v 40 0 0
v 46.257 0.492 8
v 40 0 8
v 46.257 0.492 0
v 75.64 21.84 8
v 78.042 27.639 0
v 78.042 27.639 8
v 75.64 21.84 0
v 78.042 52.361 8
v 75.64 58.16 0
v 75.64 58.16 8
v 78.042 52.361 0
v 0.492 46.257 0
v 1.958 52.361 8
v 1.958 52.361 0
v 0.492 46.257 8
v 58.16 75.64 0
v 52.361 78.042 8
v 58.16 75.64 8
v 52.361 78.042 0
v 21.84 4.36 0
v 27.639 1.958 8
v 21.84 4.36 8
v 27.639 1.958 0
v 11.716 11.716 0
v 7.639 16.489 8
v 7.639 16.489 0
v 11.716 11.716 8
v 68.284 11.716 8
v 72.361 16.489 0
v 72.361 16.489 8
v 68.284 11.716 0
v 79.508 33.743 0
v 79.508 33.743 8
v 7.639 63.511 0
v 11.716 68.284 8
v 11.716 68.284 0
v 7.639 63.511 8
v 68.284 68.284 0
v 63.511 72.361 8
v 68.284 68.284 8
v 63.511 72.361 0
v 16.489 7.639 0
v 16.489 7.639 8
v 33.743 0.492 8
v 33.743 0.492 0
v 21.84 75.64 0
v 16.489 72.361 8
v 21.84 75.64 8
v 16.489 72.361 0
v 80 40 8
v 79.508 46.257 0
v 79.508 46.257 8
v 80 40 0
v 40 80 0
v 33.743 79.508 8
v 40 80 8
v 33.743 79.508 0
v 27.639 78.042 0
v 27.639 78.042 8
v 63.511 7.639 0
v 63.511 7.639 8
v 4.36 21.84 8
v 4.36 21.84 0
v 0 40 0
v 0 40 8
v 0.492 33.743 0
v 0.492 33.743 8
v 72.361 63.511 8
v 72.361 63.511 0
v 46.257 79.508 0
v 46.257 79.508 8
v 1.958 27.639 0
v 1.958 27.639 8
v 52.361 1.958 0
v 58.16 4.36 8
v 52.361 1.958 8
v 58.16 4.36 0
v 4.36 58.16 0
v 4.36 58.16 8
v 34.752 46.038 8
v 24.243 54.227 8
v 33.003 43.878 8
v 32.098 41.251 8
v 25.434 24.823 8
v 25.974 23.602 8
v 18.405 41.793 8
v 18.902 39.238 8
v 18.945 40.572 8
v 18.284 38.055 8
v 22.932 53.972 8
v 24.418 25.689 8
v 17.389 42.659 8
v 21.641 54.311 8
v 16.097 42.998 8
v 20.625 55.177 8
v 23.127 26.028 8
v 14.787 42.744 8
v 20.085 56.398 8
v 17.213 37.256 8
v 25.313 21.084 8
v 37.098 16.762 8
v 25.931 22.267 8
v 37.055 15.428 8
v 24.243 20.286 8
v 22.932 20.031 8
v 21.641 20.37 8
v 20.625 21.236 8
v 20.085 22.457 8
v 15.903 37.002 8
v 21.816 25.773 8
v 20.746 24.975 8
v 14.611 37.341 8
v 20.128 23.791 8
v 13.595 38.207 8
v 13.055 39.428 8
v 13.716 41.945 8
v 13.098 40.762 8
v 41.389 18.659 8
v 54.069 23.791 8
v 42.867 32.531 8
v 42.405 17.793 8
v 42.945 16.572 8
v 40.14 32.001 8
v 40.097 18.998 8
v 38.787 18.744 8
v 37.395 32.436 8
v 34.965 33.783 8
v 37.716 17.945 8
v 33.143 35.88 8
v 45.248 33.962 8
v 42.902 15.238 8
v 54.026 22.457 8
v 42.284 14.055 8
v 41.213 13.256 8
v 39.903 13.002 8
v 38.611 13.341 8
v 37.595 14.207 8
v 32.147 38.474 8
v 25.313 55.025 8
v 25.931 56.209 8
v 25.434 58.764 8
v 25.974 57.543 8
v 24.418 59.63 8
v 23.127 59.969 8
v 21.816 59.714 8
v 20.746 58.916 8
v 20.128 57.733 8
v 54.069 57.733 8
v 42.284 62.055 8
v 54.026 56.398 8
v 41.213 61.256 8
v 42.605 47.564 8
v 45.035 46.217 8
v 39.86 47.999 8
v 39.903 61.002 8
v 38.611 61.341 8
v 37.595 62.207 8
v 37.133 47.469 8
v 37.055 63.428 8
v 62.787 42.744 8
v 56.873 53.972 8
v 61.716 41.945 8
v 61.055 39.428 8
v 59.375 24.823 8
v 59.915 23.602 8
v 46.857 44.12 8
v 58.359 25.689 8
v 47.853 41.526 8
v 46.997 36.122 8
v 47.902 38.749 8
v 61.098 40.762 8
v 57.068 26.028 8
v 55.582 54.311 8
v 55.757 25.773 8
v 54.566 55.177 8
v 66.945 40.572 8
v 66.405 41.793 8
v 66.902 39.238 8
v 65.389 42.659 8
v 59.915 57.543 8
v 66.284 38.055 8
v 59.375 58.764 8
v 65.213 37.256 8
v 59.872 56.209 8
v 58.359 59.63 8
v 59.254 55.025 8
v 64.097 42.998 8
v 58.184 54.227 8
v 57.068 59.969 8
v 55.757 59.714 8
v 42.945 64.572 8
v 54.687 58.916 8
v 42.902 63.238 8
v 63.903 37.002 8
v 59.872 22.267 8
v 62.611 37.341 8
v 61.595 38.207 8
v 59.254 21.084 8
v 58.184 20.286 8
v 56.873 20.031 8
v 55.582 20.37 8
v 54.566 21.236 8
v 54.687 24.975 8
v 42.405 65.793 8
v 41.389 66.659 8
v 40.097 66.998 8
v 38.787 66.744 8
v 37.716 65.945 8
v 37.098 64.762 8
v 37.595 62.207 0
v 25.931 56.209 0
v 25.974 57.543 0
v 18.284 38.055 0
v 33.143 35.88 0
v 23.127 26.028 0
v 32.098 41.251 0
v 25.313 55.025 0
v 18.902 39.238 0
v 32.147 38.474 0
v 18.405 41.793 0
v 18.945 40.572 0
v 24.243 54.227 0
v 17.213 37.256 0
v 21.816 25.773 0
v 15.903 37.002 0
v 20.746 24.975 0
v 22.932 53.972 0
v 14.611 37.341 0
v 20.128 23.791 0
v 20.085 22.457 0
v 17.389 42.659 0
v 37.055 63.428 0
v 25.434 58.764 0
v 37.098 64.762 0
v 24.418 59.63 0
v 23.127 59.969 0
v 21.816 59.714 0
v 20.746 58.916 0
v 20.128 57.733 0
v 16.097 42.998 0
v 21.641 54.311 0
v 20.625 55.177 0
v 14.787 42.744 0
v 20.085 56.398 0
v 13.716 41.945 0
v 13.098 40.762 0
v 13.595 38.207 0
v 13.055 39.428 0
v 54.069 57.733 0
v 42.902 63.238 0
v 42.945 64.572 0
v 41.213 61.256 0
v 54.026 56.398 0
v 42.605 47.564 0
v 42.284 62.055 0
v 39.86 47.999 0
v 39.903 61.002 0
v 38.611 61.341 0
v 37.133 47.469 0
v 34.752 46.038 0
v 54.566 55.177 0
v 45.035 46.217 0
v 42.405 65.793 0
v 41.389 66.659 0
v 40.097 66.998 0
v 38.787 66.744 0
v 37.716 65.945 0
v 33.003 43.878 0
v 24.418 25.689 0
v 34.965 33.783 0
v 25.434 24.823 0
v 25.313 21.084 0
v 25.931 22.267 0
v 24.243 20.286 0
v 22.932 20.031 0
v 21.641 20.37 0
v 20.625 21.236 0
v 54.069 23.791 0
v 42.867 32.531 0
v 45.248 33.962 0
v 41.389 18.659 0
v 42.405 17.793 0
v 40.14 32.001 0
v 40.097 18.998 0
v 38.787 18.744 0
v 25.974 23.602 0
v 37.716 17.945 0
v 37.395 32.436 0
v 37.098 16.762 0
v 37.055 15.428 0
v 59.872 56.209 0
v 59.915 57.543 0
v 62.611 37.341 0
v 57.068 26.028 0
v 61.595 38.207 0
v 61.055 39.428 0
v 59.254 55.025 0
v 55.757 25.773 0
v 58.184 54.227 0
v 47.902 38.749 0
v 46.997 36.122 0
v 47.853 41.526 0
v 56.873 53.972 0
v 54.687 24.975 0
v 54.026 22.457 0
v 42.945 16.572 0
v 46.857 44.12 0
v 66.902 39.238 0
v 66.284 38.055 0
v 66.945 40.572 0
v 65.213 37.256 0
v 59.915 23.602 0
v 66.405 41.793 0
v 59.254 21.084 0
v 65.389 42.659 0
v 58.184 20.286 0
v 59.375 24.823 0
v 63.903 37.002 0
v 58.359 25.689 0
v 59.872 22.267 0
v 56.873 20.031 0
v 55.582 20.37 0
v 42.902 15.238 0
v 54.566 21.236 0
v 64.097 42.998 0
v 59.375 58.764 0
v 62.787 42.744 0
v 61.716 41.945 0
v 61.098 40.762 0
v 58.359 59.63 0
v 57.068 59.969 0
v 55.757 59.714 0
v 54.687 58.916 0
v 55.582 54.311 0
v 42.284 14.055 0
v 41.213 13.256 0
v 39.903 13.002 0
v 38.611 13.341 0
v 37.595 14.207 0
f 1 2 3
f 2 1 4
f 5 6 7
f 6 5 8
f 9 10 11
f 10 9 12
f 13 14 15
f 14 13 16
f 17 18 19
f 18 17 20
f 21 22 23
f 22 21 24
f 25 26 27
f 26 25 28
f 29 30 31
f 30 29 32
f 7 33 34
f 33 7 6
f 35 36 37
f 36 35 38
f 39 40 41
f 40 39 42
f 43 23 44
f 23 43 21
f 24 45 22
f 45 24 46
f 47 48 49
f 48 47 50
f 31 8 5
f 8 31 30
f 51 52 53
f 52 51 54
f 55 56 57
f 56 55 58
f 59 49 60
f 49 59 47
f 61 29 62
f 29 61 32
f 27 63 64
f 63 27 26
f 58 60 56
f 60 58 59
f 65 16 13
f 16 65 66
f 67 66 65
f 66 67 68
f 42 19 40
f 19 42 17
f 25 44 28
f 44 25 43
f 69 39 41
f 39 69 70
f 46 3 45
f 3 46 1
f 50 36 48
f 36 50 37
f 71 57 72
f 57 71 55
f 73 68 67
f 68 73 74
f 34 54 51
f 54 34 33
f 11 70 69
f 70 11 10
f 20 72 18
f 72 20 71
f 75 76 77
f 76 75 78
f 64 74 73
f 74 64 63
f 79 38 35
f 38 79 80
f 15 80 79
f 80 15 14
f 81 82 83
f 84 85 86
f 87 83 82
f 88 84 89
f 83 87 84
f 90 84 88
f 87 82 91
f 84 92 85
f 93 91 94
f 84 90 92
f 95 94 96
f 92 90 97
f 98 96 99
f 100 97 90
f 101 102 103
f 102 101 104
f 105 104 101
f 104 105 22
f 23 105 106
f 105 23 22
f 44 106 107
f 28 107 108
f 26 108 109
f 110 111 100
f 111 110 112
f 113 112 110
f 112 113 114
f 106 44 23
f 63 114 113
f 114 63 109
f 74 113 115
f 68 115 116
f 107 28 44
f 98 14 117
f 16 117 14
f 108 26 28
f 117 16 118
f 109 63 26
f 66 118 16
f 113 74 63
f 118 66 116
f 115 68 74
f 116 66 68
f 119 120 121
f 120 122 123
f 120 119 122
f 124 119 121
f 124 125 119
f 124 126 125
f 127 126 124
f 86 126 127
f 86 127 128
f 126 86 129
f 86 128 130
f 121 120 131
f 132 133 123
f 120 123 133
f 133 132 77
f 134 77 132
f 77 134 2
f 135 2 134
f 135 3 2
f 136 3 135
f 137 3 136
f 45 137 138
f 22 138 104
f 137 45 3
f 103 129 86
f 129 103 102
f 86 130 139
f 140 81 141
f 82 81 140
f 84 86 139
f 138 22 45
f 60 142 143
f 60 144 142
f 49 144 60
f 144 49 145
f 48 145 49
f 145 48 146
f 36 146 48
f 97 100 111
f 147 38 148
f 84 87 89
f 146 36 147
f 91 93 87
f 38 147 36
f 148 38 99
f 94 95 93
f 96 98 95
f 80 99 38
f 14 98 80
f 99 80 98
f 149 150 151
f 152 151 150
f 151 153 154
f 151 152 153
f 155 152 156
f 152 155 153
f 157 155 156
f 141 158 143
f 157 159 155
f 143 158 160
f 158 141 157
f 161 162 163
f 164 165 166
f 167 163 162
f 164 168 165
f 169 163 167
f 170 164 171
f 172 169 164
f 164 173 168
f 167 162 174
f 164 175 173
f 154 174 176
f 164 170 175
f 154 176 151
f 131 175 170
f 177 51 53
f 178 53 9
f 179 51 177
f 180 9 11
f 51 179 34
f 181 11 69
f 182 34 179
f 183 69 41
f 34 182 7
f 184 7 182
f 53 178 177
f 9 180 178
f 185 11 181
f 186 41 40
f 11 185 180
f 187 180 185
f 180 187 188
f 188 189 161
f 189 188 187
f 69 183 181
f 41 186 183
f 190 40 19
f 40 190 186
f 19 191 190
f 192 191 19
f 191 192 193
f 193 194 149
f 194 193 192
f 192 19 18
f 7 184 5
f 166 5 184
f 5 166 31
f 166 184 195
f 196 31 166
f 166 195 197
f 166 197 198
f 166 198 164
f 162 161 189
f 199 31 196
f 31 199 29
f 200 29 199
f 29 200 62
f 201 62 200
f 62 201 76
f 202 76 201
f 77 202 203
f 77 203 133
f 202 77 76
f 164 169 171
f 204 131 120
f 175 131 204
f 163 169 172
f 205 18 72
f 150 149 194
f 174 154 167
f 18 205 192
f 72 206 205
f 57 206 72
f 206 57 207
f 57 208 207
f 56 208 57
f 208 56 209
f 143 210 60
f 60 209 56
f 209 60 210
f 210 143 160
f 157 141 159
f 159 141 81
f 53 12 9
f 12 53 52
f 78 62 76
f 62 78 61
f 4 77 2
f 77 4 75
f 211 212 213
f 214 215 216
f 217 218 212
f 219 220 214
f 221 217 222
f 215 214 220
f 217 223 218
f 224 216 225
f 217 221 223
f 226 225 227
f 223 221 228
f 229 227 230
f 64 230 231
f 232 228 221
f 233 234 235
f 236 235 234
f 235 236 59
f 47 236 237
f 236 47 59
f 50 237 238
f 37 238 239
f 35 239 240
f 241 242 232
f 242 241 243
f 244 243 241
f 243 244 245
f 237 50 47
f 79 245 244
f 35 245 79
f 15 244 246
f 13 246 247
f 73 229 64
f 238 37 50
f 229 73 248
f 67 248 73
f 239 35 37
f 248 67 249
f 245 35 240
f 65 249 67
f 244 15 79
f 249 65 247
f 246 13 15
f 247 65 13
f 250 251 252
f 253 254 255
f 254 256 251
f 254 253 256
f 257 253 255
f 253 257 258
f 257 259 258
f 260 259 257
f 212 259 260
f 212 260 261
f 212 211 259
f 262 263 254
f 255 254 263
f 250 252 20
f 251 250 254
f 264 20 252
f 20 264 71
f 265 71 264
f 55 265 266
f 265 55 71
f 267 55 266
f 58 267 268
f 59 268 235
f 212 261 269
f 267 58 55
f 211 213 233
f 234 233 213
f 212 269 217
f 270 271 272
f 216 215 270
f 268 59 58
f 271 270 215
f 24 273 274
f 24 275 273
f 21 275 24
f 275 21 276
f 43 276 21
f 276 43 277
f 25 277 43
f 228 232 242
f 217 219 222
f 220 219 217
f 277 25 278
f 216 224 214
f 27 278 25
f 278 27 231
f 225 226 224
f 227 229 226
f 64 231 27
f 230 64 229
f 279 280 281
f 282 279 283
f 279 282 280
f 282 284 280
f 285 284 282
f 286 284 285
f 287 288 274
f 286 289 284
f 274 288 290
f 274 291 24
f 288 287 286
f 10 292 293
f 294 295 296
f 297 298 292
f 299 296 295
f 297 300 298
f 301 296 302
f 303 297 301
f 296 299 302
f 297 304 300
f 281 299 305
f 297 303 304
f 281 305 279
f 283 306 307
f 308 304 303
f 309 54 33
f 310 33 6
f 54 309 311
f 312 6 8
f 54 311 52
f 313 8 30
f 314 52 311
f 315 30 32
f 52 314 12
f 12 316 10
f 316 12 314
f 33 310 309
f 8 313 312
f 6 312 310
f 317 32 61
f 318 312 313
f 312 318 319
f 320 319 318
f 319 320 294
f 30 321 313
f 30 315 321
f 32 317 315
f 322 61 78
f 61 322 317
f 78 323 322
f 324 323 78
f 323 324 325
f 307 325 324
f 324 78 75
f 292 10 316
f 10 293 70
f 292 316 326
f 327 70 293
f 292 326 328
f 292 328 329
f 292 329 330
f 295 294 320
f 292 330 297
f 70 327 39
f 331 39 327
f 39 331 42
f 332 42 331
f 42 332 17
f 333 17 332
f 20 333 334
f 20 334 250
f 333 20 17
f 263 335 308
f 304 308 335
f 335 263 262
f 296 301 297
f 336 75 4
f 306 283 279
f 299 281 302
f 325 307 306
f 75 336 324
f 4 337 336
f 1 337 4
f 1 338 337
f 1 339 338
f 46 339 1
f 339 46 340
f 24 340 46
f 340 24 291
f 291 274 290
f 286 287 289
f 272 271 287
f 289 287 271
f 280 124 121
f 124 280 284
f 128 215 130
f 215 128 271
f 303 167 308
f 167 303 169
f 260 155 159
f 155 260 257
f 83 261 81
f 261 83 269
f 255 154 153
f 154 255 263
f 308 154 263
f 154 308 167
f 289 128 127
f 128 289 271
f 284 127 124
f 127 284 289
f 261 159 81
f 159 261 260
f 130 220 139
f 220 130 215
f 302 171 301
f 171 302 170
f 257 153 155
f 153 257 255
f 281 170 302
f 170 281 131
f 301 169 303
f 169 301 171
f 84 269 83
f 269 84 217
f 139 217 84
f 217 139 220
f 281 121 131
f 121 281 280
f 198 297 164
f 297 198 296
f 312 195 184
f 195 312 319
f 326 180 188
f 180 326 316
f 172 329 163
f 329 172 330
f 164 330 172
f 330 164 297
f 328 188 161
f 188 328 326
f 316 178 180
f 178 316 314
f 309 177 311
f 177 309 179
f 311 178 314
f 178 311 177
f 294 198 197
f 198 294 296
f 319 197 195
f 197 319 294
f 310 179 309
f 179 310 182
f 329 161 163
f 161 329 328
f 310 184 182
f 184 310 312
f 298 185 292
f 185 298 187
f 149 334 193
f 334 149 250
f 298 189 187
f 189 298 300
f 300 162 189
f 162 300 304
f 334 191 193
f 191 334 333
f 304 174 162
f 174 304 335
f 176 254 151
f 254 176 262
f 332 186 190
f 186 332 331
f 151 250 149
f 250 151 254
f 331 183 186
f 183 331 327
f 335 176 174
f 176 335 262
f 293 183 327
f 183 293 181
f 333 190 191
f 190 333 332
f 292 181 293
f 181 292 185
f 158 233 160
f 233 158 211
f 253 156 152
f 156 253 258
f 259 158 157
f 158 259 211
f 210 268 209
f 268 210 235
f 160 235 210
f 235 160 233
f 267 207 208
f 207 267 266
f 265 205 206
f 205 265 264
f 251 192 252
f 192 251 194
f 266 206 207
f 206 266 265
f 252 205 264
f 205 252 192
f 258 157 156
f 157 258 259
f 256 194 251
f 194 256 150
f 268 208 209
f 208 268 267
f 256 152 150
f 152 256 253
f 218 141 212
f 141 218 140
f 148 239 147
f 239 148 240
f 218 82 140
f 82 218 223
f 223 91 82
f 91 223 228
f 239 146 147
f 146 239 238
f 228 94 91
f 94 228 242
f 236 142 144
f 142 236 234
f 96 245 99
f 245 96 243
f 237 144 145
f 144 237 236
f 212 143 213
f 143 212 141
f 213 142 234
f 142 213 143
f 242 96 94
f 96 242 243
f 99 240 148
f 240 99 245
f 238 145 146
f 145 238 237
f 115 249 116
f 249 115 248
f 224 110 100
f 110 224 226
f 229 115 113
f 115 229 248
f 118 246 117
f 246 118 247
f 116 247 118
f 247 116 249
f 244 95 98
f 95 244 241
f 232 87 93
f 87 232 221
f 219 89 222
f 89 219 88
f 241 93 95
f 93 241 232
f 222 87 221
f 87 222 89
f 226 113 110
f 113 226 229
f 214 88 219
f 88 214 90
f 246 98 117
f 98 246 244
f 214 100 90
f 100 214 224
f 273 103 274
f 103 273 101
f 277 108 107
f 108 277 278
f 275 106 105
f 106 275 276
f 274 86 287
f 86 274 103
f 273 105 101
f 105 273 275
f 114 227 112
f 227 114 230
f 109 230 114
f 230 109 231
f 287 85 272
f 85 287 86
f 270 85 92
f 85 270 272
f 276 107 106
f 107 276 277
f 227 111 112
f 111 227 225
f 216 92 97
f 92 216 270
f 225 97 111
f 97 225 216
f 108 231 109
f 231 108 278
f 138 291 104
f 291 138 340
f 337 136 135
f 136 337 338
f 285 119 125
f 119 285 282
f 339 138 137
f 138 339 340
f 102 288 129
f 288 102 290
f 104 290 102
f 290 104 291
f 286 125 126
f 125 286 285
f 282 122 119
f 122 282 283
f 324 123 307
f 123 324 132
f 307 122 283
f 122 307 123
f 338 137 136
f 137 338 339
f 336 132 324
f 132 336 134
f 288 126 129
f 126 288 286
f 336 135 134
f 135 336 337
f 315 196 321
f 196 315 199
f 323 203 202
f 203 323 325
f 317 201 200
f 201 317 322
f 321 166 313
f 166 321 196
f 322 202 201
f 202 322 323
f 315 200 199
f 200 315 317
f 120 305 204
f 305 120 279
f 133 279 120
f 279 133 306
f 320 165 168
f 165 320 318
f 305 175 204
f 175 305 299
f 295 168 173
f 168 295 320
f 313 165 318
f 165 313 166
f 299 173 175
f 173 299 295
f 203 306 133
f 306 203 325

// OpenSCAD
$fn = 32;

// ----------------------------------------------------------------------
// Spacer plate: round flange R40, 8 bolts
// ----------------------------------------------------------------------

// --- parameters (mm) ---
bore_r = 8;               // centre bore radius
bolt_r = 3;               // bolt hole radius
plate_t = 8;              // plate thickness, Z (extrusion height)
flange_r = 40;            // flange radius
n_bolt = 8;               // bolt hole count
ring_r = 24;              // bolt circle radius
fit_tol = 0.05;           // declared fit tolerance (prompt contract)
free_tol = 0.3;           // declared free tolerance (prompt contract)

profile = [[80, 40], [79.508, 46.257], [78.042, 52.361], [75.64, 58.16], [72.361, 63.511], [68.284, 68.284], [63.511, 72.361], [58.16, 75.64], [52.361, 78.042], [46.257, 79.508], [40, 80], [33.743, 79.508], [27.639, 78.042], [21.84, 75.64], [16.489, 72.361], [11.716, 68.284], [7.639, 63.511], [4.36, 58.16], [1.958, 52.361], [0.492, 46.257], [0, 40], [0.492, 33.743], [1.958, 27.639], [4.36, 21.84], [7.639, 16.489], [11.716, 11.716], [16.489, 7.639], [21.84, 4.36], [27.639, 1.958], [33.743, 0.492], [40, 0], [46.257, 0.492], [52.361, 1.958], [58.16, 4.36], [63.511, 7.639], [68.284, 11.716], [72.361, 16.489], [75.64, 21.84], [78.042, 27.639], [79.508, 33.743]];  // primary outline, 40 points, counter clockwise
void_1 = [[47.853, 41.526], [46.857, 44.12], [45.035, 46.217], [42.605, 47.564], [39.86, 47.999], [37.133, 47.469], [34.752, 46.038], [33.003, 43.878], [32.098, 41.251], [32.147, 38.474], [33.143, 35.88], [34.965, 33.783], [37.395, 32.436], [40.14, 32.001], [42.867, 32.531], [45.248, 33.962], [46.997, 36.122], [47.902, 38.749]];  // centre bore, 18 points
void_2 = [[66.945, 40.572], [66.405, 41.793], [65.389, 42.659], [64.097, 42.998], [62.787, 42.744], [61.716, 41.945], [61.098, 40.762], [61.055, 39.428], [61.595, 38.207], [62.611, 37.341], [63.903, 37.002], [65.213, 37.256], [66.284, 38.055], [66.902, 39.238]];  // bolt hole 1, 14 points
void_3 = [[59.915, 57.543], [59.375, 58.764], [58.359, 59.63], [57.068, 59.969], [55.757, 59.714], [54.687, 58.916], [54.069, 57.733], [54.026, 56.398], [54.566, 55.177], [55.582, 54.311], [56.873, 53.972], [58.184, 54.227], [59.254, 55.025], [59.872, 56.209]];  // bolt hole 2, 14 points
void_4 = [[42.945, 64.572], [42.405, 65.793], [41.389, 66.659], [40.097, 66.998], [38.787, 66.744], [37.716, 65.945], [37.098, 64.762], [37.055, 63.428], [37.595, 62.207], [38.611, 61.341], [39.903, 61.002], [41.213, 61.256], [42.284, 62.055], [42.902, 63.238]];  // bolt hole 3, 14 points
void_5 = [[25.974, 57.543], [25.434, 58.764], [24.418, 59.63], [23.127, 59.969], [21.816, 59.714], [20.746, 58.916], [20.128, 57.733], [20.085, 56.398], [20.625, 55.177], [21.641, 54.311], [22.932, 53.972], [24.243, 54.227], [25.313, 55.025], [25.931, 56.209]];  // bolt hole 4, 14 points
void_6 = [[18.945, 40.572], [18.405, 41.793], [17.389, 42.659], [16.097, 42.998], [14.787, 42.744], [13.716, 41.945], [13.098, 40.762], [13.055, 39.428], [13.595, 38.207], [14.611, 37.341], [15.903, 37.002], [17.213, 37.256], [18.284, 38.055], [18.902, 39.238]];  // bolt hole 5, 14 points
void_7 = [[25.974, 23.602], [25.434, 24.823], [24.418, 25.689], [23.127, 26.028], [21.816, 25.773], [20.746, 24.975], [20.128, 23.791], [20.085, 22.457], [20.625, 21.236], [21.641, 20.37], [22.932, 20.031], [24.243, 20.286], [25.313, 21.084], [25.931, 22.267]];  // bolt hole 6, 14 points
void_8 = [[42.945, 16.572], [42.405, 17.793], [41.389, 18.659], [40.097, 18.998], [38.787, 18.744], [37.716, 17.945], [37.098, 16.762], [37.055, 15.428], [37.595, 14.207], [38.611, 13.341], [39.903, 13.002], [41.213, 13.256], [42.284, 14.055], [42.902, 15.238]];  // bolt hole 7, 14 points
void_9 = [[59.915, 23.602], [59.375, 24.823], [58.359, 25.689], [57.068, 26.028], [55.757, 25.773], [54.687, 24.975], [54.069, 23.791], [54.026, 22.457], [54.566, 21.236], [55.582, 20.37], [56.873, 20.031], [58.184, 20.286], [59.254, 21.084], [59.872, 22.267]];  // bolt hole 8, 14 points

// --- the one profile operation ---
difference() {
  linear_extrude(height = plate_t) polygon(points = profile);
  translate([0, 0, -1])
    linear_extrude(height = plate_t + 2) polygon(points = void_1);
  translate([0, 0, -1])
    linear_extrude(height = plate_t + 2) polygon(points = void_2);
  translate([0, 0, -1])
    linear_extrude(height = plate_t + 2) polygon(points = void_3);
  translate([0, 0, -1])
    linear_extrude(height = plate_t + 2) polygon(points = void_4);
  translate([0, 0, -1])
    linear_extrude(height = plate_t + 2) polygon(points = void_5);
  translate([0, 0, -1])
    linear_extrude(height = plate_t + 2) polygon(points = void_6);
  translate([0, 0, -1])
    linear_extrude(height = plate_t + 2) polygon(points = void_7);
  translate([0, 0, -1])
    linear_extrude(height = plate_t + 2) polygon(points = void_8);
  translate([0, 0, -1])
    linear_extrude(height = plate_t + 2) polygon(points = void_9);
}
